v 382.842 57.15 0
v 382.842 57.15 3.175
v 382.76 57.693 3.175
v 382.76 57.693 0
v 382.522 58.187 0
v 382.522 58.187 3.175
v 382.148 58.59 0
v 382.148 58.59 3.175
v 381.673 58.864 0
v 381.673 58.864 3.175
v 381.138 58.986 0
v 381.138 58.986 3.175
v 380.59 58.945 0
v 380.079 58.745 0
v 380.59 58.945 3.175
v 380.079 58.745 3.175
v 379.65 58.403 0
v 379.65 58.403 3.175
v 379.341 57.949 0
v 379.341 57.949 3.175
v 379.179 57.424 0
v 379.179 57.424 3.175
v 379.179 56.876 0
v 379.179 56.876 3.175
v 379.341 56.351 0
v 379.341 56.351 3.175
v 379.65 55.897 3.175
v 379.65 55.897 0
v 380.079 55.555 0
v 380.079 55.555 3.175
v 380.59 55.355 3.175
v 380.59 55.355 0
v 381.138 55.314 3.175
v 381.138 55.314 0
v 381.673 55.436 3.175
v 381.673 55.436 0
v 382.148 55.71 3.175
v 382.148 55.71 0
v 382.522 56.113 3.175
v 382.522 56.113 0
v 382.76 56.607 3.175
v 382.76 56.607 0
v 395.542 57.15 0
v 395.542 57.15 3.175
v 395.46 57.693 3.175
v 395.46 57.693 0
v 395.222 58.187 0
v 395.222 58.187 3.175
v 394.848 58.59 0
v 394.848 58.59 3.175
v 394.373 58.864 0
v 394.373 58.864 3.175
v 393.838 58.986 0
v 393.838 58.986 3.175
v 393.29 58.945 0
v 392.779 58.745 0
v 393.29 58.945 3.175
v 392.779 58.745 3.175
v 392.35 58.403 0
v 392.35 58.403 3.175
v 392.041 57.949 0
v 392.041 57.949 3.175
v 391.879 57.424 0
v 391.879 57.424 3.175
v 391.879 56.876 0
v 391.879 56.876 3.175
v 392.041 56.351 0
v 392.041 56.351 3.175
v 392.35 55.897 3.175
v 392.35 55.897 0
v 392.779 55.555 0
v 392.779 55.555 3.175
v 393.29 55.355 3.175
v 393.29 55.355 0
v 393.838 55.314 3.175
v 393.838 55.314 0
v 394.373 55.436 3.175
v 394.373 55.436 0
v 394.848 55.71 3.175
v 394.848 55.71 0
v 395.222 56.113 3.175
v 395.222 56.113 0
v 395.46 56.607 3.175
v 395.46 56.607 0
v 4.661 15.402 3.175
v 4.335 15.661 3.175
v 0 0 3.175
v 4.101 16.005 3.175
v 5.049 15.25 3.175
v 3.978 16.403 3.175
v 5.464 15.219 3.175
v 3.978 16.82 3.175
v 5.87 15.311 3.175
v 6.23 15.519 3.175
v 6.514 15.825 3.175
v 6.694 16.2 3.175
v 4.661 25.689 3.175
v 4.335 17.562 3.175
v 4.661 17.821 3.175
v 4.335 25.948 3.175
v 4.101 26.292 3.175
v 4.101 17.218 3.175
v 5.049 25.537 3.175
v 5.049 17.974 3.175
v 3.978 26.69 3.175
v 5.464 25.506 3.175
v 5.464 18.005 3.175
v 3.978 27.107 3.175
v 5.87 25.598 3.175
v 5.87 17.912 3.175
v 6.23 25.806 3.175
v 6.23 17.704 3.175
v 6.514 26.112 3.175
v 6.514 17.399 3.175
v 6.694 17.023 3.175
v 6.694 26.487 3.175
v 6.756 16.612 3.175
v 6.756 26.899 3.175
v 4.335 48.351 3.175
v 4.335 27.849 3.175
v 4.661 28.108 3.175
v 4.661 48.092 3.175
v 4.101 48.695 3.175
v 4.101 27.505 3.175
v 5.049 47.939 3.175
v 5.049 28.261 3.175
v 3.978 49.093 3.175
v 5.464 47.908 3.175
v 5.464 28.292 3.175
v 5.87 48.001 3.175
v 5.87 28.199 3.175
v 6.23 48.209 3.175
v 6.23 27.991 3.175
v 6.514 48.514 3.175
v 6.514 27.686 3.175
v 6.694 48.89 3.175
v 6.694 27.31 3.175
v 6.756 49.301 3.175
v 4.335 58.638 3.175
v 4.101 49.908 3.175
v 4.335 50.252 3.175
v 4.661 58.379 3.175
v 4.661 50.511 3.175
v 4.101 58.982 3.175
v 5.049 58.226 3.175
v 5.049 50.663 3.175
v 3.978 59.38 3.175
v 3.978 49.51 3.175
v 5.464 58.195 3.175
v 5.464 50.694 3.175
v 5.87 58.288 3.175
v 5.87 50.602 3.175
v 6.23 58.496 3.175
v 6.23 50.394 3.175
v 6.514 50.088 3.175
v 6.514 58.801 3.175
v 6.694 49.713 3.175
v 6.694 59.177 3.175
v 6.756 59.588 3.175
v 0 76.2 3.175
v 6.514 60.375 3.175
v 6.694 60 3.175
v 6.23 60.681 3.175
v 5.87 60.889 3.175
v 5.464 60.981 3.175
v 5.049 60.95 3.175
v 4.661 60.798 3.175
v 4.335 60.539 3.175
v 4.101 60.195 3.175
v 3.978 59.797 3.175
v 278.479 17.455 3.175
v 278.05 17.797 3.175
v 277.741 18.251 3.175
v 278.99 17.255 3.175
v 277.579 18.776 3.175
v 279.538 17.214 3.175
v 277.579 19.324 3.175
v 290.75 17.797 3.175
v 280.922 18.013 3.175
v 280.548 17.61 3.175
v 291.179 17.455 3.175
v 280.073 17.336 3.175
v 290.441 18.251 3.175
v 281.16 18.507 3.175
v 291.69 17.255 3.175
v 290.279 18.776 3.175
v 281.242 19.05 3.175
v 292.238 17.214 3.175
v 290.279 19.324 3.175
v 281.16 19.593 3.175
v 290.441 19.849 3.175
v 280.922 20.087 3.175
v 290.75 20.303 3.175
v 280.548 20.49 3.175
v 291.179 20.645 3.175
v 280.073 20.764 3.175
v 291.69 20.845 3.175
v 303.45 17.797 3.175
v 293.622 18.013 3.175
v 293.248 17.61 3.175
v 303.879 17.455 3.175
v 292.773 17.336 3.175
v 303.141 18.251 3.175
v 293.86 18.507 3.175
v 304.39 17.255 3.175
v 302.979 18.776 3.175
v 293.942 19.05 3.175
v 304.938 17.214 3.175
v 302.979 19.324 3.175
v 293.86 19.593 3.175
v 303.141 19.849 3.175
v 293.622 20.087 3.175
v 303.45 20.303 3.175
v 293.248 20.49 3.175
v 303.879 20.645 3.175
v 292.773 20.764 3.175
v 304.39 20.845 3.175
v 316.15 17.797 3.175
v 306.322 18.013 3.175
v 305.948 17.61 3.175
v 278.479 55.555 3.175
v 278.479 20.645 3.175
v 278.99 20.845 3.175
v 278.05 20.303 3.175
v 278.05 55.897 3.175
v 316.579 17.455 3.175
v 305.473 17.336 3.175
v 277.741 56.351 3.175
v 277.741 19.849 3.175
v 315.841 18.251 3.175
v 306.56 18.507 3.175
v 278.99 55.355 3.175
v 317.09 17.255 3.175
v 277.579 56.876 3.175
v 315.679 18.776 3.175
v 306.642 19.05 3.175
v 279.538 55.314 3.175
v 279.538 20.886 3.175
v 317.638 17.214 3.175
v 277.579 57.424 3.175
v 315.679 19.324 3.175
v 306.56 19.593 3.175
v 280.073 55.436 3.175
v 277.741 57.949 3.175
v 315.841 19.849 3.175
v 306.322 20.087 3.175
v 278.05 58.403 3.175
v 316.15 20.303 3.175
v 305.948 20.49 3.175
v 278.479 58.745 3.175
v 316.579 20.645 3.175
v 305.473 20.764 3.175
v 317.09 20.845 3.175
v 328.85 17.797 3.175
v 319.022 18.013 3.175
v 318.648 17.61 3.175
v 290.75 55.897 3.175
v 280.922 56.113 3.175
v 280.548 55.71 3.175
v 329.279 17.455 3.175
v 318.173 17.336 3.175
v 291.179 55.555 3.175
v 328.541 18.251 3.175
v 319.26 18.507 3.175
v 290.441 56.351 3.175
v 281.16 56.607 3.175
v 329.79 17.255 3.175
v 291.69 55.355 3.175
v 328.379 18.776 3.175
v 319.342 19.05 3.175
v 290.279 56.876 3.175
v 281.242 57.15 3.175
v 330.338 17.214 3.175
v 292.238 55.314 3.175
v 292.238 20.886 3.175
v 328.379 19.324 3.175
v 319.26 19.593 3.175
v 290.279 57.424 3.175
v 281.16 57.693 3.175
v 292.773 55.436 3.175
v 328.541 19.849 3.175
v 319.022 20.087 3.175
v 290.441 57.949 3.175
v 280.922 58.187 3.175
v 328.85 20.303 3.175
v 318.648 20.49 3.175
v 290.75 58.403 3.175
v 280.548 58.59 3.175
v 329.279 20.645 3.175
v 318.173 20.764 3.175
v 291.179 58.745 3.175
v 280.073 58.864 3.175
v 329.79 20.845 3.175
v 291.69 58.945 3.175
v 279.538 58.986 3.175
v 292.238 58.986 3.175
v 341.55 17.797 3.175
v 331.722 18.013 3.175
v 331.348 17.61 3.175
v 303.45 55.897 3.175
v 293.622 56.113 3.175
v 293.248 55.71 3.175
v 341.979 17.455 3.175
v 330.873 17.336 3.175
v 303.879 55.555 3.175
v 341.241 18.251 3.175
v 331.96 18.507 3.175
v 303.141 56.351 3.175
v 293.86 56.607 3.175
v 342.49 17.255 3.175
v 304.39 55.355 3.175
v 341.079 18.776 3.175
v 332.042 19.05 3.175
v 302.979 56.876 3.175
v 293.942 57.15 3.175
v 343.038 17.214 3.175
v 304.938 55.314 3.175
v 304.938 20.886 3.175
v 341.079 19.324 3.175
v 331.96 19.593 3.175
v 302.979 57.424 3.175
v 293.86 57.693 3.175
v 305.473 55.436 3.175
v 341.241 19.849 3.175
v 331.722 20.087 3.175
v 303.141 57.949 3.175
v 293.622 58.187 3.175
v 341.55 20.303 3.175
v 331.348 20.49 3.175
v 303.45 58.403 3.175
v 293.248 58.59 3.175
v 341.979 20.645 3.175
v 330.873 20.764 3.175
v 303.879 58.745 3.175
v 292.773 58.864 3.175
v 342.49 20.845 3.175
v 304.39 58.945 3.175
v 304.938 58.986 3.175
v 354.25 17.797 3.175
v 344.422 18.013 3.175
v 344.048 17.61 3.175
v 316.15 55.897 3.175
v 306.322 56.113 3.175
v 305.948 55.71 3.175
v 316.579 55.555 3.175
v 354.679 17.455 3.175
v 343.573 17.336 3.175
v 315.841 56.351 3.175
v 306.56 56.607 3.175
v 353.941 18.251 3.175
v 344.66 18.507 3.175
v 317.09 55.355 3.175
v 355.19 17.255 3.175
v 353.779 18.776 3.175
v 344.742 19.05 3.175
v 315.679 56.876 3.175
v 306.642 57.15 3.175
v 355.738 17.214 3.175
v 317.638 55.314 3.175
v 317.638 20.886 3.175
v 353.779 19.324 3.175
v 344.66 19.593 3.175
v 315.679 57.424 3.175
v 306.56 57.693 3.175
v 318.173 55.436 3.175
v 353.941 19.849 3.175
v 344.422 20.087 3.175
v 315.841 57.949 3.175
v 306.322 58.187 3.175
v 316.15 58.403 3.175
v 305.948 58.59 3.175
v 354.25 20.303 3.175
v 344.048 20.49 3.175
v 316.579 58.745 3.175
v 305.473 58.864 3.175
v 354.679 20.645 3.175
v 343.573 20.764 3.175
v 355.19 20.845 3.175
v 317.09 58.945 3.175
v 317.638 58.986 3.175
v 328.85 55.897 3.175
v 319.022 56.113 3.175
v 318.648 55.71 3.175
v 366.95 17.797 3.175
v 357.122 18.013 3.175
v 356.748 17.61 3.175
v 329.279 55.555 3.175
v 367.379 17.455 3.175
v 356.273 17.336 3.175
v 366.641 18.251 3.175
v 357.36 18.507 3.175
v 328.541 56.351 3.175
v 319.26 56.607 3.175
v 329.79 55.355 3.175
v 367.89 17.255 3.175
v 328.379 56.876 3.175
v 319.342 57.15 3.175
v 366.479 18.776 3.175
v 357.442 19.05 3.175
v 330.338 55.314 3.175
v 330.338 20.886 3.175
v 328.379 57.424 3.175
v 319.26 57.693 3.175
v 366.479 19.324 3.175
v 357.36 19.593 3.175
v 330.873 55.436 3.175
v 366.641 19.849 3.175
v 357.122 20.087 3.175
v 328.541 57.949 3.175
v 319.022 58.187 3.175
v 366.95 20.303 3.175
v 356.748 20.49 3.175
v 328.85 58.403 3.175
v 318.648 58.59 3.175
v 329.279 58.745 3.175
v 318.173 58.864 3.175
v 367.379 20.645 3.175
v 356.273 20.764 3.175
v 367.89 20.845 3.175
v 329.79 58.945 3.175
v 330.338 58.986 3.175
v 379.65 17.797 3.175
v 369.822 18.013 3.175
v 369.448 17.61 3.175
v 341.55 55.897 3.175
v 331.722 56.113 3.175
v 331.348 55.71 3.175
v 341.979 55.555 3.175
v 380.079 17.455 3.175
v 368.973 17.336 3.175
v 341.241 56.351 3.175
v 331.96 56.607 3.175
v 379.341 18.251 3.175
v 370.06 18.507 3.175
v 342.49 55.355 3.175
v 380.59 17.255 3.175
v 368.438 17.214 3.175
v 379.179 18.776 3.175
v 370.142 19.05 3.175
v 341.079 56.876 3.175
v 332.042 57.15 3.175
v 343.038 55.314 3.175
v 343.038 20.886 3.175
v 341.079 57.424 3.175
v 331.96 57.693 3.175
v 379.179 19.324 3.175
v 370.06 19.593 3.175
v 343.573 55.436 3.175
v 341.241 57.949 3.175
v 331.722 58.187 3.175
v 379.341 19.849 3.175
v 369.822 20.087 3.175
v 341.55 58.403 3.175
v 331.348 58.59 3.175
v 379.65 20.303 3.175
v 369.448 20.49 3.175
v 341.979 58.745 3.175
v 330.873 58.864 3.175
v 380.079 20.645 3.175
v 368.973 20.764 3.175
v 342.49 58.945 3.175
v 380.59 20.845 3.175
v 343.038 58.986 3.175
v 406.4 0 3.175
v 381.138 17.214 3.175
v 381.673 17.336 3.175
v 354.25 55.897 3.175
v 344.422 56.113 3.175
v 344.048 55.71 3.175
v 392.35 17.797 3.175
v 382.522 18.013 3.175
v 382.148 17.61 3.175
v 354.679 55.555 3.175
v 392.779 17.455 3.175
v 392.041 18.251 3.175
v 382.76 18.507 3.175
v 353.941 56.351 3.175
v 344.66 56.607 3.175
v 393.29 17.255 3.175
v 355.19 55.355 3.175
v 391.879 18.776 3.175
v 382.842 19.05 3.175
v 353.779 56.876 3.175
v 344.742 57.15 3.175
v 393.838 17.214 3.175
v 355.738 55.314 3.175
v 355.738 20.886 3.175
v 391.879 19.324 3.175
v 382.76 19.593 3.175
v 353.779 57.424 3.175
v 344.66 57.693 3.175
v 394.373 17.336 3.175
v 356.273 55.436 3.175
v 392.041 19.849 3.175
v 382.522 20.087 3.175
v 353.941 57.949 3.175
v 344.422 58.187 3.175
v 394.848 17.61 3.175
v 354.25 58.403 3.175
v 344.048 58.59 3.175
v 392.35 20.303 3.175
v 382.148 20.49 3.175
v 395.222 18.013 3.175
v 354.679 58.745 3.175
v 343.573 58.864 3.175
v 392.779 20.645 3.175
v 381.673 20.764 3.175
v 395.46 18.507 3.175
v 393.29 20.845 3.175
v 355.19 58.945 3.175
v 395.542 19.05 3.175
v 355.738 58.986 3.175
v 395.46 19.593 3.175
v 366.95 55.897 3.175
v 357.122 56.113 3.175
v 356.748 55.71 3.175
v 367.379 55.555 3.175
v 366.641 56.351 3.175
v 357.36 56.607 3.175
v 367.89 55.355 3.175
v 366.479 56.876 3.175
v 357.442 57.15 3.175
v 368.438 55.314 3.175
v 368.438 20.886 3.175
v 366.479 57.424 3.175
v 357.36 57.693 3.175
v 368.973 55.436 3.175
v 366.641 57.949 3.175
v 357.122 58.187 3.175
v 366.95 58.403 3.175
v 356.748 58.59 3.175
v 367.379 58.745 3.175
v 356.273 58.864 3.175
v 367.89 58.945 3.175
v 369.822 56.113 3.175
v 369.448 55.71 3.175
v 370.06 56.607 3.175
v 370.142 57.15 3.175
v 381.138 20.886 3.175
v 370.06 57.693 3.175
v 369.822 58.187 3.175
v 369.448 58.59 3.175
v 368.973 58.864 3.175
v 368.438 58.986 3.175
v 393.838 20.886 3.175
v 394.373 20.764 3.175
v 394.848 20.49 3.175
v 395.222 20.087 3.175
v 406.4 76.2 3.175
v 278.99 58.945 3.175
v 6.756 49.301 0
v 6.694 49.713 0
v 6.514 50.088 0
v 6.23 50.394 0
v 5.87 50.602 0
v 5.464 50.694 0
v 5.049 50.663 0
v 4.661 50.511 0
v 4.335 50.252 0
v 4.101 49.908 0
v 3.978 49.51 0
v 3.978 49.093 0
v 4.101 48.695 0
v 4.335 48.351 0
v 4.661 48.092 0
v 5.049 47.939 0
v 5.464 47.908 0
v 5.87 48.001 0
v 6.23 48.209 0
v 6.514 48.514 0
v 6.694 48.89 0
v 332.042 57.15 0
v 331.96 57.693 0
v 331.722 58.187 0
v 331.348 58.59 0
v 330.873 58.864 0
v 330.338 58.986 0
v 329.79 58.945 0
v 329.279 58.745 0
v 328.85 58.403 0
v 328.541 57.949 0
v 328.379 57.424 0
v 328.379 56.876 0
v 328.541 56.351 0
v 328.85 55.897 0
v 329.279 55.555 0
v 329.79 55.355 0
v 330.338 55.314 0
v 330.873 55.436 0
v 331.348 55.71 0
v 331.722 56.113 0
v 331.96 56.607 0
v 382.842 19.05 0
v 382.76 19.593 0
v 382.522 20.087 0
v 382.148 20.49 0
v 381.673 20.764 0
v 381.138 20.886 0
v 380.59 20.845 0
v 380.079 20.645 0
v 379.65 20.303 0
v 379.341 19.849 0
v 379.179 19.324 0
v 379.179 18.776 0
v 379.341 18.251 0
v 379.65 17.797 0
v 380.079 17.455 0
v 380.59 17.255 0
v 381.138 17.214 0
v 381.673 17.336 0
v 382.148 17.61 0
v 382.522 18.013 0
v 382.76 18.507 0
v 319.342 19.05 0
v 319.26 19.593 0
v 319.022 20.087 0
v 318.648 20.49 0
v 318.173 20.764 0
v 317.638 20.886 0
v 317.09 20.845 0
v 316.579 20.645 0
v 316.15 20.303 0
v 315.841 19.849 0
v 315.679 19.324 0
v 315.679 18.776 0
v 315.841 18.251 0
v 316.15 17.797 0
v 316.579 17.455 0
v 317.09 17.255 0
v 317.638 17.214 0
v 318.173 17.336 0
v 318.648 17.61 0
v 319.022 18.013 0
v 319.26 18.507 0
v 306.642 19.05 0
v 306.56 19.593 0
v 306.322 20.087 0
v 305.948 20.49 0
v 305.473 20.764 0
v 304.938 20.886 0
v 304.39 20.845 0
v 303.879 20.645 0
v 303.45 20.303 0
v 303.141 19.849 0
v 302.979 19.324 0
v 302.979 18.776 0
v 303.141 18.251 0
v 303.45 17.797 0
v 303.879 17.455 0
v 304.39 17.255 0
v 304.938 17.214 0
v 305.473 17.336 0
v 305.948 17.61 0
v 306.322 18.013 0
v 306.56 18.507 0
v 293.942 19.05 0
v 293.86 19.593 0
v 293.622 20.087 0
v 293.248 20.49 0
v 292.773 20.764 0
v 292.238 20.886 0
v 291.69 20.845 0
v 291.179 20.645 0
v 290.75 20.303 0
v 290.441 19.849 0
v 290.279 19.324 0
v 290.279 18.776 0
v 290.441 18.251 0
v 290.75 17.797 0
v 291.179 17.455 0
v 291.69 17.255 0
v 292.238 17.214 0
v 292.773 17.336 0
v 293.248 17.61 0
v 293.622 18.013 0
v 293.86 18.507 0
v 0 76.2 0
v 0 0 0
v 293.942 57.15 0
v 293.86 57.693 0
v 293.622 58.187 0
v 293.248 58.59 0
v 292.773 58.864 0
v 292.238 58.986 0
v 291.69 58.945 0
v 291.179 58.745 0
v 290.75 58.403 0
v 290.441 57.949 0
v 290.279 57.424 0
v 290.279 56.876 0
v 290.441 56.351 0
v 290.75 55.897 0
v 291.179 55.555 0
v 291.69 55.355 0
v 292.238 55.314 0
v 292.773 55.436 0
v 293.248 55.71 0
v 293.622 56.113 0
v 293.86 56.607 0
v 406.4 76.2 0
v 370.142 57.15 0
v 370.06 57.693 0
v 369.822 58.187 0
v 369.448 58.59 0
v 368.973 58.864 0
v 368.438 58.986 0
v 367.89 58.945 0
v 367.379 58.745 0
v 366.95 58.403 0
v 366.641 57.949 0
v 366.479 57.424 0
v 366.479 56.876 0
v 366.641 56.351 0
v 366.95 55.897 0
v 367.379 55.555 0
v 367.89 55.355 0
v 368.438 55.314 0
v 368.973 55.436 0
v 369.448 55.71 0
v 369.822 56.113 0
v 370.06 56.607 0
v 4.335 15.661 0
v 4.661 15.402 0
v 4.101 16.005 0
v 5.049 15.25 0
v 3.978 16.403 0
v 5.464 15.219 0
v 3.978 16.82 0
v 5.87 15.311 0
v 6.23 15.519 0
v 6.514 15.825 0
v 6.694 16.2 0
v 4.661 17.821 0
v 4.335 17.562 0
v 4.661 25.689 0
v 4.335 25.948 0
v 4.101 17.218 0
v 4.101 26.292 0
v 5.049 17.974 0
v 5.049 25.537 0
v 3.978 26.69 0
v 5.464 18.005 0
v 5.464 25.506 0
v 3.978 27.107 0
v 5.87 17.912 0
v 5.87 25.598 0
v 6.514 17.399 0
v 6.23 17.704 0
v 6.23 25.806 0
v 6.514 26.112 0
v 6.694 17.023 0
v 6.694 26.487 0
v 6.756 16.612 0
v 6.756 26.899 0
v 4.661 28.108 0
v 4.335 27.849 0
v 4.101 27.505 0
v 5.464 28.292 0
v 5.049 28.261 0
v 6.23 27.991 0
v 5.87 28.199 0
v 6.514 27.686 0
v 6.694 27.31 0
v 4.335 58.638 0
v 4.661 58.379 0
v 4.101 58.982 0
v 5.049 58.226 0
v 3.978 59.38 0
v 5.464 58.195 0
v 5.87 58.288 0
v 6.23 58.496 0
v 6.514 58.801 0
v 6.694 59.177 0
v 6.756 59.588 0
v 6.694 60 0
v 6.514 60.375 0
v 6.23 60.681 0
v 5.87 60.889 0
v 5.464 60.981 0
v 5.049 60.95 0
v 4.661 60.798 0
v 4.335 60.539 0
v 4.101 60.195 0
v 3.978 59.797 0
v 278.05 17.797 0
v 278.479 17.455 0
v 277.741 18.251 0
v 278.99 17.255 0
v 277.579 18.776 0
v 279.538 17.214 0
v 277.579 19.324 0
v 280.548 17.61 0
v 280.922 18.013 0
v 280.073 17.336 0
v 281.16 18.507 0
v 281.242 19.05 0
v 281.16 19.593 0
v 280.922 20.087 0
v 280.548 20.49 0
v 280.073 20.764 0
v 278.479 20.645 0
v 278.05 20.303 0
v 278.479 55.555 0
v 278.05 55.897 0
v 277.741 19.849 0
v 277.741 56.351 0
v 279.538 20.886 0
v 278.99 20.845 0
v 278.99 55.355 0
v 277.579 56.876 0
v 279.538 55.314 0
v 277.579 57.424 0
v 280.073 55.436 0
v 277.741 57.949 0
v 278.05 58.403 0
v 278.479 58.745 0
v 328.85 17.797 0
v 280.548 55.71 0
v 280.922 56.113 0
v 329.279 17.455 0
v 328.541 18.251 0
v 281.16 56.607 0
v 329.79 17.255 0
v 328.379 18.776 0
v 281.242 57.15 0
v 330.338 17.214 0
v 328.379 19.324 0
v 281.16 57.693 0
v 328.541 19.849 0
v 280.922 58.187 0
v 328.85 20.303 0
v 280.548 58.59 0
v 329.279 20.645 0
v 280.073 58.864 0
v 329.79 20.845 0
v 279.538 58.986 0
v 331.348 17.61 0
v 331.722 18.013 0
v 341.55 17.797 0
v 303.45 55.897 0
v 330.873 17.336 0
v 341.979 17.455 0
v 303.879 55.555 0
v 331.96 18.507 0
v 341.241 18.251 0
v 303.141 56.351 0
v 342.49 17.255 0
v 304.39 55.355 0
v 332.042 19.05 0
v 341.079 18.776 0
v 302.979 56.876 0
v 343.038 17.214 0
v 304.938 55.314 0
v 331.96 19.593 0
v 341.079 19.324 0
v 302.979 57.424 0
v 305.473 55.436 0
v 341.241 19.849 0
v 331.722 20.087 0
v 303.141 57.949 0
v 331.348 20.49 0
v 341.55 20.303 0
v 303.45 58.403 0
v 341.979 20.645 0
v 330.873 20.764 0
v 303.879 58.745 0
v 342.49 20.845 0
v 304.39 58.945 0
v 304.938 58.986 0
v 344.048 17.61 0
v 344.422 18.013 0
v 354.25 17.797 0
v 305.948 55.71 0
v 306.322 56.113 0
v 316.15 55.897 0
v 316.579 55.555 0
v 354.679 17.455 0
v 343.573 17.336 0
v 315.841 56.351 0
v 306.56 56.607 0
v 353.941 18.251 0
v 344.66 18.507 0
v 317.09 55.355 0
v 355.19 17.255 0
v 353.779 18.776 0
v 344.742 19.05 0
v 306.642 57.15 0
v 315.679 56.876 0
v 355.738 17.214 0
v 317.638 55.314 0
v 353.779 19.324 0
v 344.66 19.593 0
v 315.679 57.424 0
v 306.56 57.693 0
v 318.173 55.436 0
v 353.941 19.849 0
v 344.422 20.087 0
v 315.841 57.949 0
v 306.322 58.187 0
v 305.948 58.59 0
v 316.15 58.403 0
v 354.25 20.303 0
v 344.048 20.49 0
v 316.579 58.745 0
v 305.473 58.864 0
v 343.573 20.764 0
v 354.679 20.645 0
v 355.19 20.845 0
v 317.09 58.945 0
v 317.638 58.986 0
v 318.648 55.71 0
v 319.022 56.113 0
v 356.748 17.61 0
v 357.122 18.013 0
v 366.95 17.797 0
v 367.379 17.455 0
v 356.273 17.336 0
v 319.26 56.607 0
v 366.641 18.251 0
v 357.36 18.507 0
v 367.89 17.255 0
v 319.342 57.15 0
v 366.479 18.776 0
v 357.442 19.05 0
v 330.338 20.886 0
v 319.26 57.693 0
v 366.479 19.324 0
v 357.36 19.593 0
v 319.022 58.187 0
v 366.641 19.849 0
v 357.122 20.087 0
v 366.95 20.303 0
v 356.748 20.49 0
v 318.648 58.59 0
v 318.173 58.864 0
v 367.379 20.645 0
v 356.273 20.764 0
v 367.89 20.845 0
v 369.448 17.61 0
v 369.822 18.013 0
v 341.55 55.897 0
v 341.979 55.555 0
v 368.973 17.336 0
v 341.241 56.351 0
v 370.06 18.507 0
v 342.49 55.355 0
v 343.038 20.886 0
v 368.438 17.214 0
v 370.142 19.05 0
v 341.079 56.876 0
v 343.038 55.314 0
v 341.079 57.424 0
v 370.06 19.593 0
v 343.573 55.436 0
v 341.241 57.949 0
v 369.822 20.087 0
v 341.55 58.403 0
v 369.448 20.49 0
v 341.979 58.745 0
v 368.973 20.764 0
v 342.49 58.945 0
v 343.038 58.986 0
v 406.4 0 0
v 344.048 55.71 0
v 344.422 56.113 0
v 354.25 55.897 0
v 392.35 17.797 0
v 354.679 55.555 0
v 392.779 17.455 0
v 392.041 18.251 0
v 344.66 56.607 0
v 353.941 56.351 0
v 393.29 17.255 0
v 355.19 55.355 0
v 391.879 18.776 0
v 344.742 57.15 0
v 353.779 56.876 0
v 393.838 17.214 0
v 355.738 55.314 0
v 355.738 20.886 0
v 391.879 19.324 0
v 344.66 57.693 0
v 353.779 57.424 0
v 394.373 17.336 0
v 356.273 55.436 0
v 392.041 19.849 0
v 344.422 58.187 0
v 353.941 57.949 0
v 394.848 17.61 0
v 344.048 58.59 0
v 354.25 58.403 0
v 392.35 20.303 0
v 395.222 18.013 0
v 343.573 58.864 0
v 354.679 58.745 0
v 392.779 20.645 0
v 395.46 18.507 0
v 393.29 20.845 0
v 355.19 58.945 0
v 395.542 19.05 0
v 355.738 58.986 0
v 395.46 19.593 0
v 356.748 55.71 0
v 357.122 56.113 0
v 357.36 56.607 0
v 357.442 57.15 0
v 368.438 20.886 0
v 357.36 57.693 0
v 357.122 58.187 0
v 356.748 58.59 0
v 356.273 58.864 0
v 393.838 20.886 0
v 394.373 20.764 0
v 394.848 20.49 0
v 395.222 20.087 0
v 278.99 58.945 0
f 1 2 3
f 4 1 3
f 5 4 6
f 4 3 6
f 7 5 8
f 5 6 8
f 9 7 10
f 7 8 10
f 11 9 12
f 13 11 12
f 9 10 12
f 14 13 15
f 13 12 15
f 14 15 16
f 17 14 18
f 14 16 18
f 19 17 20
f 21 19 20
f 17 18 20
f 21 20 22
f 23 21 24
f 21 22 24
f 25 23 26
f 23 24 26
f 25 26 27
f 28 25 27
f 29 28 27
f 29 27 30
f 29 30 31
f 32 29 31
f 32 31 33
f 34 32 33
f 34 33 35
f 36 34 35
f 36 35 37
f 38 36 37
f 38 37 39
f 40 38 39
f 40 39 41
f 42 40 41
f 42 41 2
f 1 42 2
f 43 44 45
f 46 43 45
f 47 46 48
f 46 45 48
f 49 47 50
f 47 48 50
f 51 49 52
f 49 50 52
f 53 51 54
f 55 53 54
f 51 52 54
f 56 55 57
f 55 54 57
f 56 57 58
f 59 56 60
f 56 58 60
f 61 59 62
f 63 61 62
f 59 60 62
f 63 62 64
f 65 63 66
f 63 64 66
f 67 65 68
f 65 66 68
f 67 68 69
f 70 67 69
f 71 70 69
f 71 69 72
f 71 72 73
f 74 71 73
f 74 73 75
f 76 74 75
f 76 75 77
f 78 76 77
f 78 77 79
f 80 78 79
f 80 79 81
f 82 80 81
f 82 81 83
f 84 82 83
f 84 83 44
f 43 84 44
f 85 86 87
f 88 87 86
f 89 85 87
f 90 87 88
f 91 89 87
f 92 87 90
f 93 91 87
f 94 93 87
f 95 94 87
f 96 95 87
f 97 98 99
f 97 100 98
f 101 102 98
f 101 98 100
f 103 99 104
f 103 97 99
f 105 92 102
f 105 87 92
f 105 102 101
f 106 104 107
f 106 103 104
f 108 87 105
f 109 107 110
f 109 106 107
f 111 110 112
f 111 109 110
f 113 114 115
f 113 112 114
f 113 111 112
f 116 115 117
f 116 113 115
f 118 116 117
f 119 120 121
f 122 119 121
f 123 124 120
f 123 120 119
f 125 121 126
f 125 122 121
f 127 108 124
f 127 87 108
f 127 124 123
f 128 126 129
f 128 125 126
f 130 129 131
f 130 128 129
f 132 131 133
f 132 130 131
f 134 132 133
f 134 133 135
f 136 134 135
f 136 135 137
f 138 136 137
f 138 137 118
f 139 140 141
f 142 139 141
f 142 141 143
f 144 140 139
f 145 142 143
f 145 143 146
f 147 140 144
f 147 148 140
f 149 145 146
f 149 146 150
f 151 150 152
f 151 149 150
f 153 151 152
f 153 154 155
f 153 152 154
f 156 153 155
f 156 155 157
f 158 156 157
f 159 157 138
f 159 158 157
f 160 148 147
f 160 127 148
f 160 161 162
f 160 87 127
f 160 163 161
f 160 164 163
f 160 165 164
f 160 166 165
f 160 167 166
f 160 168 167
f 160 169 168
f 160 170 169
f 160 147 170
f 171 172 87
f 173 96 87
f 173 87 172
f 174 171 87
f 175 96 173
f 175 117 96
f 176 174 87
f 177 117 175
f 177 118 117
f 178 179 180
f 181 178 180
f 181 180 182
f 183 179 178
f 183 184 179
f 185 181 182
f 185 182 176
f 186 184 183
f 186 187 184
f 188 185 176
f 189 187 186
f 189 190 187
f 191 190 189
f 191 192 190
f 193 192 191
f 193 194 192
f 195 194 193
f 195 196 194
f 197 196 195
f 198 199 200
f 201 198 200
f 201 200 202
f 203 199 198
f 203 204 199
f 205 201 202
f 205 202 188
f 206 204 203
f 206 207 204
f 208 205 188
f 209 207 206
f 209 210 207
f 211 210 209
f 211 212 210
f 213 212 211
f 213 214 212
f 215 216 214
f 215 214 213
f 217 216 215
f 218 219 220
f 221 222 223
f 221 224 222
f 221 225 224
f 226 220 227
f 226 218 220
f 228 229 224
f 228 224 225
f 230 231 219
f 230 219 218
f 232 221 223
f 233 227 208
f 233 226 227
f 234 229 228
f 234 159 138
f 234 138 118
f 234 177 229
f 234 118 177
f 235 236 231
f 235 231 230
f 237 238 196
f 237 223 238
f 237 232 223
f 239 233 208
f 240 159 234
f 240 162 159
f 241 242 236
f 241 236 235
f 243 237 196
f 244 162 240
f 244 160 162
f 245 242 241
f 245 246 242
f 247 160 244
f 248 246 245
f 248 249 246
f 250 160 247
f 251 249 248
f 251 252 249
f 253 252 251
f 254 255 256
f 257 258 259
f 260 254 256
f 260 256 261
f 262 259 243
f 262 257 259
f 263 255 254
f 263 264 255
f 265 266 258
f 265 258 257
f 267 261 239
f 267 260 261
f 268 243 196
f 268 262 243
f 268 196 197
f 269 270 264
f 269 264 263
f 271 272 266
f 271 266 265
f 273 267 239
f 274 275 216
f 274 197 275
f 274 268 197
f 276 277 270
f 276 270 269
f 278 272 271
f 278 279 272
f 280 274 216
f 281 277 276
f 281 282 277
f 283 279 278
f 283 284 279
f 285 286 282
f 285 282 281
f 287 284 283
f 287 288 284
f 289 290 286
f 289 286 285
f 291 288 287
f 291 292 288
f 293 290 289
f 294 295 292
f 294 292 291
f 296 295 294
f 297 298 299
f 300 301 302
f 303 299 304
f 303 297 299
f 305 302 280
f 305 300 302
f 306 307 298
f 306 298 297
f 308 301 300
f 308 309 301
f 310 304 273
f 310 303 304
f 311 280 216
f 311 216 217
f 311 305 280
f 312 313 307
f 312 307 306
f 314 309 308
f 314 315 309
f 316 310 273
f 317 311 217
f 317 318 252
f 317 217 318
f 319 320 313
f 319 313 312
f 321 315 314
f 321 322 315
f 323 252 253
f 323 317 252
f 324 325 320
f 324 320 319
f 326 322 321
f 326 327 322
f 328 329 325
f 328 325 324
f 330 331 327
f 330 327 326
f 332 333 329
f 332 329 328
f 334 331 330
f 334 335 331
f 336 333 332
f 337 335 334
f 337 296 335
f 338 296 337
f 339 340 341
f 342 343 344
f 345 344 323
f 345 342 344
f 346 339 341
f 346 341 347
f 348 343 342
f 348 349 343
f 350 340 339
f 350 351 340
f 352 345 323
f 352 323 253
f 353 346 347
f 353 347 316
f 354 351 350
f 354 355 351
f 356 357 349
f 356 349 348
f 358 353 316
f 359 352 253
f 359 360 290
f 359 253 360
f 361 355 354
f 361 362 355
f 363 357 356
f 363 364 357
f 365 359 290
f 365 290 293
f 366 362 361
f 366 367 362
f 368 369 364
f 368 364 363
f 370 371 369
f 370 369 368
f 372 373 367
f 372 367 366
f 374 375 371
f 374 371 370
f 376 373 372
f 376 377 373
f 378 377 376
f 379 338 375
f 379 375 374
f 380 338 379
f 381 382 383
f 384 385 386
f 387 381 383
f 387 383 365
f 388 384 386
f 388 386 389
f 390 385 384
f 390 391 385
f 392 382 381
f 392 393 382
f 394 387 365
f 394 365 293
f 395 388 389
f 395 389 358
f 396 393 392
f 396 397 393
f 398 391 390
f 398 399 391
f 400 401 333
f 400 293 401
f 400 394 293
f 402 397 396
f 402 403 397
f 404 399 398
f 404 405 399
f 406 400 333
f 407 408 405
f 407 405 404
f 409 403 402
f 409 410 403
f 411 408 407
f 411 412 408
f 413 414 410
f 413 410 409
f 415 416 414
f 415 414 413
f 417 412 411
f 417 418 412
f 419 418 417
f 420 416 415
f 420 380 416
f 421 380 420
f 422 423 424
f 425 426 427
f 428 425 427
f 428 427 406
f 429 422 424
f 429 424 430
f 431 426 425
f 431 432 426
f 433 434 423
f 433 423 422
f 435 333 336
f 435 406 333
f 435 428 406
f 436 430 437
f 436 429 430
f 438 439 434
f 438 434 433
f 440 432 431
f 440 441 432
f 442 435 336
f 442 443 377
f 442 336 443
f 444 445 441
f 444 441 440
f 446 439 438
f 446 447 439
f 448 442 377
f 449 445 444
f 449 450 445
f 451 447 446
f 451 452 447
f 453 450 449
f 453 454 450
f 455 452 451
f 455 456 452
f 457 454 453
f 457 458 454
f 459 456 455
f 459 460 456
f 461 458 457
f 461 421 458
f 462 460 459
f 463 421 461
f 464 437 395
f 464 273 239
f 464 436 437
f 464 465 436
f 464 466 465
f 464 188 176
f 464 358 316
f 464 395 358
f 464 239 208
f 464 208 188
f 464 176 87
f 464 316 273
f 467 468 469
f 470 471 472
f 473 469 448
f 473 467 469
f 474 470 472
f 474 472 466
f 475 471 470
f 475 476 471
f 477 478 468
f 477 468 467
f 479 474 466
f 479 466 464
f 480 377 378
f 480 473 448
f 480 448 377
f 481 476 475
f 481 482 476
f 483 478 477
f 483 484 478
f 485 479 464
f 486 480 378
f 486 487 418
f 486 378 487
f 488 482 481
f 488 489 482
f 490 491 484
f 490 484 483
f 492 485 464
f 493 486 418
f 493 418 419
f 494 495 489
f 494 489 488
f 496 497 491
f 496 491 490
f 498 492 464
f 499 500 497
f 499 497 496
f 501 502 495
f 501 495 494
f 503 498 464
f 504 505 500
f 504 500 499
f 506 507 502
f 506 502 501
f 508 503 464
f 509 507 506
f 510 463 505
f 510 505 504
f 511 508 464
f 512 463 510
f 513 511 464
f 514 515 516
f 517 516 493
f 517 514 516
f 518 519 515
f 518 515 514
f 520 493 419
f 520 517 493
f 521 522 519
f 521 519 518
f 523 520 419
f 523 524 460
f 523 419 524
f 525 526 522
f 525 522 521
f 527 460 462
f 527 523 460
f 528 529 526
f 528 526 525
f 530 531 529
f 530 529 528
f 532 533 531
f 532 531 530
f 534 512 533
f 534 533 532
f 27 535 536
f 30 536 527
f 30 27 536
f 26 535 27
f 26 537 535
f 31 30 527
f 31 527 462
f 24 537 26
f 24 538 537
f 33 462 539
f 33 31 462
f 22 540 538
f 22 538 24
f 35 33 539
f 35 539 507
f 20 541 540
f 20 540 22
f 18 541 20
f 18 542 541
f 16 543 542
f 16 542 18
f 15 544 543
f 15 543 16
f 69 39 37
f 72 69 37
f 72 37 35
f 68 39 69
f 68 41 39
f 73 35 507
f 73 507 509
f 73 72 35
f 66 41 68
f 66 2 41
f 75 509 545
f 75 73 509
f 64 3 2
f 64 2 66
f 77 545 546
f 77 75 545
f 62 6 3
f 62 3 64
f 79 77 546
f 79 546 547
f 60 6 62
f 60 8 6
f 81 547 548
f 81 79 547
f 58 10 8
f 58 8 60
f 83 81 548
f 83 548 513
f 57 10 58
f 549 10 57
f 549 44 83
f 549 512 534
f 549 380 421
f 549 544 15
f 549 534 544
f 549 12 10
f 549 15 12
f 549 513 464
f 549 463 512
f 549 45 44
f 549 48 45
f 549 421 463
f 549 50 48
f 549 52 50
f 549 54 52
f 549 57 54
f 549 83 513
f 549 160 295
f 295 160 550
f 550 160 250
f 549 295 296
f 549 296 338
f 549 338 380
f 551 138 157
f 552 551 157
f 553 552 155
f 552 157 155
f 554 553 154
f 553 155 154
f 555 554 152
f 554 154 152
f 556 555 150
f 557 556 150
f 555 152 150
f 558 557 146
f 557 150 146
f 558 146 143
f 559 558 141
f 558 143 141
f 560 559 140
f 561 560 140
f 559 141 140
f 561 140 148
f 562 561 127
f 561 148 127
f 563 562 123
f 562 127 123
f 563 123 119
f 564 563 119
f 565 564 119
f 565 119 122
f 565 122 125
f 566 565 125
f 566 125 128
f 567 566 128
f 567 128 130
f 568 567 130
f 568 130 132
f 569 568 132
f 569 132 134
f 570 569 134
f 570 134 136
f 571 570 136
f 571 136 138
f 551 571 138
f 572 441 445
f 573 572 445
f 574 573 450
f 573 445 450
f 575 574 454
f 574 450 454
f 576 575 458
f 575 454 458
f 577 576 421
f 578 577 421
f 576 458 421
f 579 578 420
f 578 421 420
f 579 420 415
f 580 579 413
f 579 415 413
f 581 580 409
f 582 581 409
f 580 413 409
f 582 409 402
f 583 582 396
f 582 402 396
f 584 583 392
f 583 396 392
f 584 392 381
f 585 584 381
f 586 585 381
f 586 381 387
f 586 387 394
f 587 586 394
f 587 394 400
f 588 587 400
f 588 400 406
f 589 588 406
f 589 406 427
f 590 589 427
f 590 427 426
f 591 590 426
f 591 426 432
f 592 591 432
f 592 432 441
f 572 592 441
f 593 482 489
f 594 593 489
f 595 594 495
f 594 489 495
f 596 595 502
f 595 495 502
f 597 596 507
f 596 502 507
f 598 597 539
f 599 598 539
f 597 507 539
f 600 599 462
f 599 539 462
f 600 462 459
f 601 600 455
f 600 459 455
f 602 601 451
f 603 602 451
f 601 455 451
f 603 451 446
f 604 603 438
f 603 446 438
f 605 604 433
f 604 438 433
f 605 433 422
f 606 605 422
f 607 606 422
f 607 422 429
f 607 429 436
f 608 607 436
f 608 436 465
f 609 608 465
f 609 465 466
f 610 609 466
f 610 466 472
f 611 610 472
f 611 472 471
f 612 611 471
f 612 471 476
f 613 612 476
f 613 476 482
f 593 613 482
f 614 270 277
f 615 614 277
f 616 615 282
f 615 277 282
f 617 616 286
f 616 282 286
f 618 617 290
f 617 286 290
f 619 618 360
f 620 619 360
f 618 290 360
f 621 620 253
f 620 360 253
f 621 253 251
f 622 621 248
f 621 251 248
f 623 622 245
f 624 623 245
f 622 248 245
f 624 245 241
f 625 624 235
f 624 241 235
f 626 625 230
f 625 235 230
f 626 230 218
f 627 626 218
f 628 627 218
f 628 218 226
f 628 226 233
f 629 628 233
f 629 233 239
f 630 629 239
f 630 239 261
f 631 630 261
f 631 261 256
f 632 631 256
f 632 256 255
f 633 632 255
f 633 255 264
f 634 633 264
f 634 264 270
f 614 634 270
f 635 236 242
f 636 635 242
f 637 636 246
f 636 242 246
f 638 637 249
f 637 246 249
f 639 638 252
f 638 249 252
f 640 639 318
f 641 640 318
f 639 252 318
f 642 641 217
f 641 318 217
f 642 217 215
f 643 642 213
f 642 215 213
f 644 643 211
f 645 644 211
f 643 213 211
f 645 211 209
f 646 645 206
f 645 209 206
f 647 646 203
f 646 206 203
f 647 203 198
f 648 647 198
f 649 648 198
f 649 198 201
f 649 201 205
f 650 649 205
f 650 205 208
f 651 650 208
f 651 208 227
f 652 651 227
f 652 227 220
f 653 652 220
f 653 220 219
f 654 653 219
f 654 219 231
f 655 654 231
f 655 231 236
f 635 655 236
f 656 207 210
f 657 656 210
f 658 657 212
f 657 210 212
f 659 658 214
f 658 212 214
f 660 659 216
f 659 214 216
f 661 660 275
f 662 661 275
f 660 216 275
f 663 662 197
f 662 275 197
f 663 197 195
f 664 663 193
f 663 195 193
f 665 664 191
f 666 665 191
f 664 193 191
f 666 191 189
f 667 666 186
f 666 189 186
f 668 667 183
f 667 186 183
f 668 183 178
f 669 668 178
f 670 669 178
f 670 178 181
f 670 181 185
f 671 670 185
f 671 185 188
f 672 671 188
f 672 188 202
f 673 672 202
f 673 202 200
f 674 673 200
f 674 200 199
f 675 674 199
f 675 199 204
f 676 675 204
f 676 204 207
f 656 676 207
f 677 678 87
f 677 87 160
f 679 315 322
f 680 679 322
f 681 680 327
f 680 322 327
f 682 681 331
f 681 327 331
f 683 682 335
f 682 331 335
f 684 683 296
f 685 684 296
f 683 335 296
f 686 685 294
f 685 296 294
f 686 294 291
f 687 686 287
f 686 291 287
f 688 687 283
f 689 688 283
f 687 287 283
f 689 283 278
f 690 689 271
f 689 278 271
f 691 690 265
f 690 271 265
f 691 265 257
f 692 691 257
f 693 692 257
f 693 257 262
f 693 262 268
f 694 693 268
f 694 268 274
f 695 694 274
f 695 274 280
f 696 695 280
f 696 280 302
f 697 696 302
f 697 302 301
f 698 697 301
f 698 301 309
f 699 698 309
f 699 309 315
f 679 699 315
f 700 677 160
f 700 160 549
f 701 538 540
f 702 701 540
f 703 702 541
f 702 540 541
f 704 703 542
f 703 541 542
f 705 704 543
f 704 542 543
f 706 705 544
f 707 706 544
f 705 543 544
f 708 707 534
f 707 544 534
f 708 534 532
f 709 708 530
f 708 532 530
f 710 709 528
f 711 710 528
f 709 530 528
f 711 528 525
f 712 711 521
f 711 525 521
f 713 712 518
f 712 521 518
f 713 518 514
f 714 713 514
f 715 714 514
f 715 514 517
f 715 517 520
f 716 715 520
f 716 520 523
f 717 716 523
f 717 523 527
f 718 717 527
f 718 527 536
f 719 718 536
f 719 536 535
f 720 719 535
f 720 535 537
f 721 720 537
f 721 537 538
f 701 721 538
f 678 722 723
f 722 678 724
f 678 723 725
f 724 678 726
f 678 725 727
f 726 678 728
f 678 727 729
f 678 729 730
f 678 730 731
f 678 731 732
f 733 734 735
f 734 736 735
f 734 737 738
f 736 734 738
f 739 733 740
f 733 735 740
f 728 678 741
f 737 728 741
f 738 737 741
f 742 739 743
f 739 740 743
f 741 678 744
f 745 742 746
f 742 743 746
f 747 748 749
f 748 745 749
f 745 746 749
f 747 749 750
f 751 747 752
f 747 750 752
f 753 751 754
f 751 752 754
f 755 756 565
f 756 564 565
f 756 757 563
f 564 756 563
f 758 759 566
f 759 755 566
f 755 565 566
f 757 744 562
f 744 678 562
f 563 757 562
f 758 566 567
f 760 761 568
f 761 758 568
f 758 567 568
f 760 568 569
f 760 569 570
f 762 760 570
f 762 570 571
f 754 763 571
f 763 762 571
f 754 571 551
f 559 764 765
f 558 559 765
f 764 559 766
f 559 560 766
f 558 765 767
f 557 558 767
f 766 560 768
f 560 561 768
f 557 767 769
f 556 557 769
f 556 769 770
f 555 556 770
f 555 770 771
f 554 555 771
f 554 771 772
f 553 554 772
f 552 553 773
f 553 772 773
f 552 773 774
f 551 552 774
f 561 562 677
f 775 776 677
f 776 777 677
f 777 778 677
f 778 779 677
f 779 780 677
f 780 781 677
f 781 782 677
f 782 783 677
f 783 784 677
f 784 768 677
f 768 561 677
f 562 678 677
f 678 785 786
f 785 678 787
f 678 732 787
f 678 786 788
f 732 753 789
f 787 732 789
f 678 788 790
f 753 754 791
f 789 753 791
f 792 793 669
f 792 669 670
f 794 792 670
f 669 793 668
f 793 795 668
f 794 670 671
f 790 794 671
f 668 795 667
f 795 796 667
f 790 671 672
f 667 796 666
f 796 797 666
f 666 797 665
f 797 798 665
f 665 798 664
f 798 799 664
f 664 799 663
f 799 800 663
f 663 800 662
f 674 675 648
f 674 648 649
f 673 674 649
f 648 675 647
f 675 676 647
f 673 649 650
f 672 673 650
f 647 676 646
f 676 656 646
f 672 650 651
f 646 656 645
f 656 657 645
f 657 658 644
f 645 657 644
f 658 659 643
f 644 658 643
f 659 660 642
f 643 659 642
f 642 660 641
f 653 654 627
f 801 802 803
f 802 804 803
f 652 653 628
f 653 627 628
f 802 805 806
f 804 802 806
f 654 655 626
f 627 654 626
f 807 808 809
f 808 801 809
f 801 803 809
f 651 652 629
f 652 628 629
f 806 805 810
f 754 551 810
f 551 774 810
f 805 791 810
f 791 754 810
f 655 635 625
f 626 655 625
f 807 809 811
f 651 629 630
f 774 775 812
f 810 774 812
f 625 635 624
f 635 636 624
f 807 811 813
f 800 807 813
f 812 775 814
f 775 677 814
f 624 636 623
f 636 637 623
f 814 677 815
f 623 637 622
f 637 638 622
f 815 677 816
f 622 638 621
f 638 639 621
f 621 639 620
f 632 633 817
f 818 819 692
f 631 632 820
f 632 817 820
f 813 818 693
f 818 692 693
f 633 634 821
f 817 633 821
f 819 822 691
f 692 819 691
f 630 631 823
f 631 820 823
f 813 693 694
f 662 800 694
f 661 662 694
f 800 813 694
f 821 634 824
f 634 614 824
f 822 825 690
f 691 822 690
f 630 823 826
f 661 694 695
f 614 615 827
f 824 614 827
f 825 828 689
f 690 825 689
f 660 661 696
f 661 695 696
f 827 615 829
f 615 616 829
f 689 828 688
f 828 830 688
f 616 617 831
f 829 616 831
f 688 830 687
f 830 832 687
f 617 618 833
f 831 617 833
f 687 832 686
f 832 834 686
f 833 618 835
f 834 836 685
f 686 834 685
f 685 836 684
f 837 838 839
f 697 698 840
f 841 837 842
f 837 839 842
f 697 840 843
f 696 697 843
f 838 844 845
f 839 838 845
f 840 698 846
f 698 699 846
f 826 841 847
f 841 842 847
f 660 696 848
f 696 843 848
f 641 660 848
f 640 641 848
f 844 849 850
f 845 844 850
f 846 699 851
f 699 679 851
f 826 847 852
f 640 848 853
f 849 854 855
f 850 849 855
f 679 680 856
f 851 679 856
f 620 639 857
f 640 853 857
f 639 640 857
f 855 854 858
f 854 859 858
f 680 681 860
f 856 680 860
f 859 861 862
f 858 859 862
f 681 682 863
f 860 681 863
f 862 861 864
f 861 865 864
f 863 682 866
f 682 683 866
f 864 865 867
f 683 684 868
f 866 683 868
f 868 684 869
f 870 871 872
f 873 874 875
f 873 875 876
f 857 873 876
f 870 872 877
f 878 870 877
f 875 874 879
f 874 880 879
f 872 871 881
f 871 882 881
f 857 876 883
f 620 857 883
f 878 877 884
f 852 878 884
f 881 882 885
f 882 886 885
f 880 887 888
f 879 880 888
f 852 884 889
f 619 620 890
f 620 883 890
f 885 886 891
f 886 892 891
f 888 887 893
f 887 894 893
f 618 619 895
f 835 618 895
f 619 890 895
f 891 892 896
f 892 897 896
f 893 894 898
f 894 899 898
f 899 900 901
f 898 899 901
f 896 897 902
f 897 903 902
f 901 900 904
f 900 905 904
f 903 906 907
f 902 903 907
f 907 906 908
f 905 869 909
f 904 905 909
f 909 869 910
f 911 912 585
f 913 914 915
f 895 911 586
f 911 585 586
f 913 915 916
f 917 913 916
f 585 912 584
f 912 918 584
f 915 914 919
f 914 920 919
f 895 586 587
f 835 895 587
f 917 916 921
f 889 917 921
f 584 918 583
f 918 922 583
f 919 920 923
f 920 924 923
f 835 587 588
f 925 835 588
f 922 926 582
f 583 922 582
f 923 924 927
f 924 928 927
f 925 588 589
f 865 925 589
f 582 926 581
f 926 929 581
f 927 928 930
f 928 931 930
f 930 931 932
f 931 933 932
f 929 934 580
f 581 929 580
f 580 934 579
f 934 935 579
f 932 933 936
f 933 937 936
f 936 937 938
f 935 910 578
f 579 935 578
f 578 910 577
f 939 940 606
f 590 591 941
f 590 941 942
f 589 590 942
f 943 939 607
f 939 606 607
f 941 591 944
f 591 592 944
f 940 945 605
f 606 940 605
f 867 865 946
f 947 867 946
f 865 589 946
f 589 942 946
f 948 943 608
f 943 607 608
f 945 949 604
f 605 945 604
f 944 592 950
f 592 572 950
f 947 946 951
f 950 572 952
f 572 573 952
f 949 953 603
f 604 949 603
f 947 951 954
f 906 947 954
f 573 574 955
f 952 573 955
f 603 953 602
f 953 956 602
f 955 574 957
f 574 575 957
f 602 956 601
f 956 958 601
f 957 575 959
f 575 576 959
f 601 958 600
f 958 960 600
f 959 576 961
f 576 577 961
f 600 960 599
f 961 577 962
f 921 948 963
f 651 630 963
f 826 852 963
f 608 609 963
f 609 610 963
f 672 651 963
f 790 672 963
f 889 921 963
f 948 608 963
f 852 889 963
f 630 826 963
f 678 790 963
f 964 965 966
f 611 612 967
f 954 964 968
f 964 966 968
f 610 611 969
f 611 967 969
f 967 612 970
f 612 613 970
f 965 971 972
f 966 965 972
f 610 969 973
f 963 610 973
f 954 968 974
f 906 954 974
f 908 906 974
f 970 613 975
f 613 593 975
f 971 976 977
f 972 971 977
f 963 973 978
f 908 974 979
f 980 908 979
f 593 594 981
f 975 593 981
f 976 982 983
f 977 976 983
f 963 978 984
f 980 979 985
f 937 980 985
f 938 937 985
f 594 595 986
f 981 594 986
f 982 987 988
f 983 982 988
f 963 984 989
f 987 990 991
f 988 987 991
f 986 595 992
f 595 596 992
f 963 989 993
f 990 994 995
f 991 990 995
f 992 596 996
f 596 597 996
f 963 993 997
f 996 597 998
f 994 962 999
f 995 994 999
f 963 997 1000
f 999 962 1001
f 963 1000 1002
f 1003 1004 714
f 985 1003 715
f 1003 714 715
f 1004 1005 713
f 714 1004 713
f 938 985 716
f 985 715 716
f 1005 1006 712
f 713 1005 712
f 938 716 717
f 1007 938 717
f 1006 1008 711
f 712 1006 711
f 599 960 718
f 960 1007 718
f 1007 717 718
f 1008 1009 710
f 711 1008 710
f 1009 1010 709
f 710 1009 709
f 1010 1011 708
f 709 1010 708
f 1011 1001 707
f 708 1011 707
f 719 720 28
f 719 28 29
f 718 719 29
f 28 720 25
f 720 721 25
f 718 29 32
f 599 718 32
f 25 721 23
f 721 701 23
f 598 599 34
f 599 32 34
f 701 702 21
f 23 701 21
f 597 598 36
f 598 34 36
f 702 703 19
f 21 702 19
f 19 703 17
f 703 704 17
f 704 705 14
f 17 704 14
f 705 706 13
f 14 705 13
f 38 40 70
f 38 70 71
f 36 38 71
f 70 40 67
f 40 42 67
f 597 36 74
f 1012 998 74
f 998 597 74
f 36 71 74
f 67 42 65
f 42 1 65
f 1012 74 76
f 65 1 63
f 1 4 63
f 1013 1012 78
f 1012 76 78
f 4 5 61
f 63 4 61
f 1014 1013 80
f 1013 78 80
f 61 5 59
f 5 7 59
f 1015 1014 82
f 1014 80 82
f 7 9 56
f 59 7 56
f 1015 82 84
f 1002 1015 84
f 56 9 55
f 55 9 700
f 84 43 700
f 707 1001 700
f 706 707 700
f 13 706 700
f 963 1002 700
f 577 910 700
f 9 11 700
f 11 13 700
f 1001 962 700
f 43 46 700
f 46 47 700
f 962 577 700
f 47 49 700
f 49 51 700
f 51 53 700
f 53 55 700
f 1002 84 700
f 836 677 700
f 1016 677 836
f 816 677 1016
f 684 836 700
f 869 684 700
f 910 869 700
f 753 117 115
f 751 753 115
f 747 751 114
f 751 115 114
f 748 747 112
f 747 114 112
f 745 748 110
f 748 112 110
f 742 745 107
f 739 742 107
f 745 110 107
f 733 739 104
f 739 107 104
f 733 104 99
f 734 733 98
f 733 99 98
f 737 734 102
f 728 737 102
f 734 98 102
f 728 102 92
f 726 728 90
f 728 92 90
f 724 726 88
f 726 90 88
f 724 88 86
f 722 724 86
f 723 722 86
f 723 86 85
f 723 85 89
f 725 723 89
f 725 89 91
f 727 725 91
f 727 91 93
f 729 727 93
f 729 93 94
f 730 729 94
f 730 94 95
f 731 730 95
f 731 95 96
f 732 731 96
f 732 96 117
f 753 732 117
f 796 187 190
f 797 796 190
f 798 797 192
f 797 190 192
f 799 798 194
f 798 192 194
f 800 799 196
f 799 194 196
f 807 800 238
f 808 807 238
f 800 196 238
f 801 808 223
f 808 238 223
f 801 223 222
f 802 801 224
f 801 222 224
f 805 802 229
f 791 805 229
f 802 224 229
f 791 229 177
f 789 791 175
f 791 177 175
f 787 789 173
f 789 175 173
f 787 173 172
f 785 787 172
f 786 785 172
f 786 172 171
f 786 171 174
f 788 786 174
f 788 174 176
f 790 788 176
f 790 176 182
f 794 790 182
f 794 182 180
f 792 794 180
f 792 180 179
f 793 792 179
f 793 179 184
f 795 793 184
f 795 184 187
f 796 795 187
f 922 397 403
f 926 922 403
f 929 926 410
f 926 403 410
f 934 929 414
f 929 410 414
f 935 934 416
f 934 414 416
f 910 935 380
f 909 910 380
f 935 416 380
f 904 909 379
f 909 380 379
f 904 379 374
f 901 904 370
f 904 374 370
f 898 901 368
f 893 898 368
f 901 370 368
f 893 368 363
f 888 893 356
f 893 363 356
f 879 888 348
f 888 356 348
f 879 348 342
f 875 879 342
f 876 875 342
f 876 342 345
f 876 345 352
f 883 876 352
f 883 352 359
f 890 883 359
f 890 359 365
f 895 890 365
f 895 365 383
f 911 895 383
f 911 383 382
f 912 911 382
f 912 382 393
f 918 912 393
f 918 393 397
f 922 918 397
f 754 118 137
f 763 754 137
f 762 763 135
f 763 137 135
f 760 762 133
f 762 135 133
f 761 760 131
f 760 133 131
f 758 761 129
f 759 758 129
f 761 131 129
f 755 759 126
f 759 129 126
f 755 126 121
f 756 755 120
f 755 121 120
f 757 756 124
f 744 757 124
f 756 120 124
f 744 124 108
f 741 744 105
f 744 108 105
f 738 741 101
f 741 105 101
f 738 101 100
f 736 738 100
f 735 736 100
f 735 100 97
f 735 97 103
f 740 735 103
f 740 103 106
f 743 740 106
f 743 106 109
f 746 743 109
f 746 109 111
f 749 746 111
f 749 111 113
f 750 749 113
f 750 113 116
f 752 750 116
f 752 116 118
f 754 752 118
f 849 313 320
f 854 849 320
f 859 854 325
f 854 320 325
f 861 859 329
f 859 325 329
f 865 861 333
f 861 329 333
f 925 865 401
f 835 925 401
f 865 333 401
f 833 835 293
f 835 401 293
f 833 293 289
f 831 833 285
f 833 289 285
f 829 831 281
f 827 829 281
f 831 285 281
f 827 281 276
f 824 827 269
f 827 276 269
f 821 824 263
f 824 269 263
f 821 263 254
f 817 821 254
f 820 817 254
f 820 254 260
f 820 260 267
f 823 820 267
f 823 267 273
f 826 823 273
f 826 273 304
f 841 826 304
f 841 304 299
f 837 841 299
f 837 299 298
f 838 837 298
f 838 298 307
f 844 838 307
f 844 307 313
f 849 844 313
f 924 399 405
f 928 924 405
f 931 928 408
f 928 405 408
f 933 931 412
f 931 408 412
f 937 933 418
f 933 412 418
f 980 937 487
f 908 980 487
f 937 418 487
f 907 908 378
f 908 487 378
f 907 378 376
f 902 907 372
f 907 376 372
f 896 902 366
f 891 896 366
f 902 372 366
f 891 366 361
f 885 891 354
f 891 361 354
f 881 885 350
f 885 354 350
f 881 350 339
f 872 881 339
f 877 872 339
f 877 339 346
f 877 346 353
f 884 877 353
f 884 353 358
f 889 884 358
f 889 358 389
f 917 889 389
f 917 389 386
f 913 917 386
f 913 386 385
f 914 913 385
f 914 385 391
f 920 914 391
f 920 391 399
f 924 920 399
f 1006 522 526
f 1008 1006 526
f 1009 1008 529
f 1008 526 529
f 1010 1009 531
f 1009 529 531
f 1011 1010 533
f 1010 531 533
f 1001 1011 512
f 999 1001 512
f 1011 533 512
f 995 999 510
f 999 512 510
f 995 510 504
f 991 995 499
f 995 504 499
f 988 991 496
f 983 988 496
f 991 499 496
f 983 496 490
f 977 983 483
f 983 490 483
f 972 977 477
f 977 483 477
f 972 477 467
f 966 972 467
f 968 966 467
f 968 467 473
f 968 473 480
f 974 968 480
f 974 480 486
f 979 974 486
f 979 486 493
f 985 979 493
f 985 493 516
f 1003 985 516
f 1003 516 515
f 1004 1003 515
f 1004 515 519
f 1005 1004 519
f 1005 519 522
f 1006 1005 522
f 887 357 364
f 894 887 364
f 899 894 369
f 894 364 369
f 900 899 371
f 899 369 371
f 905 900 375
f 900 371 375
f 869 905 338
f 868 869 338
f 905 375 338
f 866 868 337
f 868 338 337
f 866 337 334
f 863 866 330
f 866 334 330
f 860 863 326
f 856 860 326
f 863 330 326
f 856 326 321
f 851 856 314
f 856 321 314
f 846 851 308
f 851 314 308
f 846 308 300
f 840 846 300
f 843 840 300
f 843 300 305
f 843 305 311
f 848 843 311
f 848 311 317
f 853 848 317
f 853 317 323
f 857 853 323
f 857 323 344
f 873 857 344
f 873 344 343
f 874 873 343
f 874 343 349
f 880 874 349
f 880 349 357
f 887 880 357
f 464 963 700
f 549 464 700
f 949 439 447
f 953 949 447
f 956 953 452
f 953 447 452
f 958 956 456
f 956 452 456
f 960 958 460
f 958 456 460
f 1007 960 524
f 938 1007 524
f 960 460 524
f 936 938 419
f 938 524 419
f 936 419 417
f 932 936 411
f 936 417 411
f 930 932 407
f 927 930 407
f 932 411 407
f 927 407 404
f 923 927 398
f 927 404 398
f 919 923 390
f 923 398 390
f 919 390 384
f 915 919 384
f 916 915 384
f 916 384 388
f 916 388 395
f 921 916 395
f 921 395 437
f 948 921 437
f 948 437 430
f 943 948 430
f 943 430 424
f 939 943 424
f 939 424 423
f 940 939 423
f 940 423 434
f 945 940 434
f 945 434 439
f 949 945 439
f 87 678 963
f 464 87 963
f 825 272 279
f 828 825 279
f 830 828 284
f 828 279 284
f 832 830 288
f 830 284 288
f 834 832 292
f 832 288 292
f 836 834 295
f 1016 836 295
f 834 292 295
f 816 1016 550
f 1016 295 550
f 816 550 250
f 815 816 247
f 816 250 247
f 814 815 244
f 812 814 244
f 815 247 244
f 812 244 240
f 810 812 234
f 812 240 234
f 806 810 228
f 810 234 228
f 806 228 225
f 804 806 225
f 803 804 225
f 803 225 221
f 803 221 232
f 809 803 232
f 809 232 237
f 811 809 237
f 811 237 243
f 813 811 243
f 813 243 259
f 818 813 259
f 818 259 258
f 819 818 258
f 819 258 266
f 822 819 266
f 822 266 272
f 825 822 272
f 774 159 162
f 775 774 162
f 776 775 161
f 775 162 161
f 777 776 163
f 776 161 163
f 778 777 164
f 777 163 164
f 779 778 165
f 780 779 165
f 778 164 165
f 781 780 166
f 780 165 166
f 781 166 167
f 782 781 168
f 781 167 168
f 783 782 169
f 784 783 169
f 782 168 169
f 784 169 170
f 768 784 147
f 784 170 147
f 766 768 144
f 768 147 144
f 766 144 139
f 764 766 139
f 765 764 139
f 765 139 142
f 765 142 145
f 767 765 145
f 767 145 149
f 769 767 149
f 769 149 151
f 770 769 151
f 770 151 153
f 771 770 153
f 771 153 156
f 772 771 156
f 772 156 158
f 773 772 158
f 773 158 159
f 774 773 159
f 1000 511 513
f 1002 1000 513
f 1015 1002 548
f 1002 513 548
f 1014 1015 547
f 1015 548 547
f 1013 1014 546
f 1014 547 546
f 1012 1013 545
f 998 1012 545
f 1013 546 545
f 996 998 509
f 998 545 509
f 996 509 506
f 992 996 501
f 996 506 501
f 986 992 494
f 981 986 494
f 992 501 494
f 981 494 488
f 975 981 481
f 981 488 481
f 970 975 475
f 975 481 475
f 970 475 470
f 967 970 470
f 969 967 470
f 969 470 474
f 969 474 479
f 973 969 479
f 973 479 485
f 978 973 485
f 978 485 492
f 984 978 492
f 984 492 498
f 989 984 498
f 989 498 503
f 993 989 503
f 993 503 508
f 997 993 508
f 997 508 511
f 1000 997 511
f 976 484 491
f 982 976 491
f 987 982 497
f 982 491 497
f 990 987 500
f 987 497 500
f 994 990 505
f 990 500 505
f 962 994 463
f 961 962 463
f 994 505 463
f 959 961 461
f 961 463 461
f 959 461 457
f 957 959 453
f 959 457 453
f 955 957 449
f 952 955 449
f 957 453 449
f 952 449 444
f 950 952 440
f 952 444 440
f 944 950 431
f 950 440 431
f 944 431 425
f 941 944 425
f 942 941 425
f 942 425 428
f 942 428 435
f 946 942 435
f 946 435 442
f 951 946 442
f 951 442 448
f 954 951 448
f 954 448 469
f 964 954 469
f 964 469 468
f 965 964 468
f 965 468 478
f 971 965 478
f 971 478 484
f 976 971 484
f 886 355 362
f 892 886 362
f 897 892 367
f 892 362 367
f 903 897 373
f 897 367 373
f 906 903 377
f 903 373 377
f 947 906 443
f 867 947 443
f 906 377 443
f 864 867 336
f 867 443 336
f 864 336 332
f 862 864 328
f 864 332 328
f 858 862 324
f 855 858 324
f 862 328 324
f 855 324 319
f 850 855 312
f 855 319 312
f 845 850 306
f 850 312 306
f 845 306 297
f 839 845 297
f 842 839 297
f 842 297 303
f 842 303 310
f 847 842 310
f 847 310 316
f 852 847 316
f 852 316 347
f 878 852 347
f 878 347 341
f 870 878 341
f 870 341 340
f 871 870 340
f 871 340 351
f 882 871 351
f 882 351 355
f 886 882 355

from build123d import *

# Parameters (mm, degrees)
SKETCH1_W             = 406.4
SKETCH1_H             = 76.2
BASIC_PLANK_DEPTH     = 3.175
SKETCH5_R             = 1.397
BRACKET_HOLES_DEPTH   = 4.175
SKETCH6_R             = 1.8415
PLACEMENT_HOLES_DEPTH = 4.175


with BuildPart() as part:
    # Sketch1 → basic_plank (new body)
    with BuildSketch(Plane.XY):
        with Locations((203.2, 38.1)):
            Rectangle(SKETCH1_W, SKETCH1_H)
    extrude(amount=BASIC_PLANK_DEPTH)

    # Sketch5 → bracket holes (cut, through all)
    with BuildSketch(Plane.XY.offset(3.175)):
        with Locations((5.3594, 59.5884)):
            Circle(SKETCH5_R)
        with Locations((5.3594, 16.6116)):
            Circle(SKETCH5_R)
        with Locations((5.3594, 49.3014)):
            Circle(SKETCH5_R)
        with Locations((5.3594, 26.8986)):
            Circle(SKETCH5_R)
    extrude(amount=-BRACKET_HOLES_DEPTH, mode=Mode.SUBTRACT)

    # Sketch6 → placement holes (cut, through all)
    with BuildSketch(Plane.XY.offset(3.175)):
        with Locations((279.4, 57.15)):
            Circle(SKETCH6_R)
        with Locations((292.1, 57.15)):
            Circle(SKETCH6_R)
        with Locations((304.8, 57.15)):
            Circle(SKETCH6_R)
        with Locations((317.5, 57.15)):
            Circle(SKETCH6_R)
        with Locations((330.2, 57.15)):
            Circle(SKETCH6_R)
        with Locations((342.9, 57.15)):
            Circle(SKETCH6_R)
        with Locations((355.6, 57.15)):
            Circle(SKETCH6_R)
        with Locations((368.3, 57.15)):
            Circle(SKETCH6_R)
        with Locations((381, 57.15)):
            Circle(SKETCH6_R)
        with Locations((393.7, 57.15)):
            Circle(SKETCH6_R)
        with Locations((393.7, 19.05)):
            Circle(SKETCH6_R)
        with Locations((381, 19.05)):
            Circle(SKETCH6_R)
        with Locations((368.3, 19.05)):
            Circle(SKETCH6_R)
        with Locations((355.6, 19.05)):
            Circle(SKETCH6_R)
        with Locations((342.9, 19.05)):
            Circle(SKETCH6_R)
        with Locations((330.2, 19.05)):
            Circle(SKETCH6_R)
        with Locations((317.5, 19.05)):
            Circle(SKETCH6_R)
        with Locations((304.8, 19.05)):
            Circle(SKETCH6_R)
        with Locations((292.1, 19.05)):
            Circle(SKETCH6_R)
        with Locations((279.4, 19.05)):
            Circle(SKETCH6_R)
    extrude(amount=-PLACEMENT_HOLES_DEPTH, mode=Mode.SUBTRACT)


solid = part.part
